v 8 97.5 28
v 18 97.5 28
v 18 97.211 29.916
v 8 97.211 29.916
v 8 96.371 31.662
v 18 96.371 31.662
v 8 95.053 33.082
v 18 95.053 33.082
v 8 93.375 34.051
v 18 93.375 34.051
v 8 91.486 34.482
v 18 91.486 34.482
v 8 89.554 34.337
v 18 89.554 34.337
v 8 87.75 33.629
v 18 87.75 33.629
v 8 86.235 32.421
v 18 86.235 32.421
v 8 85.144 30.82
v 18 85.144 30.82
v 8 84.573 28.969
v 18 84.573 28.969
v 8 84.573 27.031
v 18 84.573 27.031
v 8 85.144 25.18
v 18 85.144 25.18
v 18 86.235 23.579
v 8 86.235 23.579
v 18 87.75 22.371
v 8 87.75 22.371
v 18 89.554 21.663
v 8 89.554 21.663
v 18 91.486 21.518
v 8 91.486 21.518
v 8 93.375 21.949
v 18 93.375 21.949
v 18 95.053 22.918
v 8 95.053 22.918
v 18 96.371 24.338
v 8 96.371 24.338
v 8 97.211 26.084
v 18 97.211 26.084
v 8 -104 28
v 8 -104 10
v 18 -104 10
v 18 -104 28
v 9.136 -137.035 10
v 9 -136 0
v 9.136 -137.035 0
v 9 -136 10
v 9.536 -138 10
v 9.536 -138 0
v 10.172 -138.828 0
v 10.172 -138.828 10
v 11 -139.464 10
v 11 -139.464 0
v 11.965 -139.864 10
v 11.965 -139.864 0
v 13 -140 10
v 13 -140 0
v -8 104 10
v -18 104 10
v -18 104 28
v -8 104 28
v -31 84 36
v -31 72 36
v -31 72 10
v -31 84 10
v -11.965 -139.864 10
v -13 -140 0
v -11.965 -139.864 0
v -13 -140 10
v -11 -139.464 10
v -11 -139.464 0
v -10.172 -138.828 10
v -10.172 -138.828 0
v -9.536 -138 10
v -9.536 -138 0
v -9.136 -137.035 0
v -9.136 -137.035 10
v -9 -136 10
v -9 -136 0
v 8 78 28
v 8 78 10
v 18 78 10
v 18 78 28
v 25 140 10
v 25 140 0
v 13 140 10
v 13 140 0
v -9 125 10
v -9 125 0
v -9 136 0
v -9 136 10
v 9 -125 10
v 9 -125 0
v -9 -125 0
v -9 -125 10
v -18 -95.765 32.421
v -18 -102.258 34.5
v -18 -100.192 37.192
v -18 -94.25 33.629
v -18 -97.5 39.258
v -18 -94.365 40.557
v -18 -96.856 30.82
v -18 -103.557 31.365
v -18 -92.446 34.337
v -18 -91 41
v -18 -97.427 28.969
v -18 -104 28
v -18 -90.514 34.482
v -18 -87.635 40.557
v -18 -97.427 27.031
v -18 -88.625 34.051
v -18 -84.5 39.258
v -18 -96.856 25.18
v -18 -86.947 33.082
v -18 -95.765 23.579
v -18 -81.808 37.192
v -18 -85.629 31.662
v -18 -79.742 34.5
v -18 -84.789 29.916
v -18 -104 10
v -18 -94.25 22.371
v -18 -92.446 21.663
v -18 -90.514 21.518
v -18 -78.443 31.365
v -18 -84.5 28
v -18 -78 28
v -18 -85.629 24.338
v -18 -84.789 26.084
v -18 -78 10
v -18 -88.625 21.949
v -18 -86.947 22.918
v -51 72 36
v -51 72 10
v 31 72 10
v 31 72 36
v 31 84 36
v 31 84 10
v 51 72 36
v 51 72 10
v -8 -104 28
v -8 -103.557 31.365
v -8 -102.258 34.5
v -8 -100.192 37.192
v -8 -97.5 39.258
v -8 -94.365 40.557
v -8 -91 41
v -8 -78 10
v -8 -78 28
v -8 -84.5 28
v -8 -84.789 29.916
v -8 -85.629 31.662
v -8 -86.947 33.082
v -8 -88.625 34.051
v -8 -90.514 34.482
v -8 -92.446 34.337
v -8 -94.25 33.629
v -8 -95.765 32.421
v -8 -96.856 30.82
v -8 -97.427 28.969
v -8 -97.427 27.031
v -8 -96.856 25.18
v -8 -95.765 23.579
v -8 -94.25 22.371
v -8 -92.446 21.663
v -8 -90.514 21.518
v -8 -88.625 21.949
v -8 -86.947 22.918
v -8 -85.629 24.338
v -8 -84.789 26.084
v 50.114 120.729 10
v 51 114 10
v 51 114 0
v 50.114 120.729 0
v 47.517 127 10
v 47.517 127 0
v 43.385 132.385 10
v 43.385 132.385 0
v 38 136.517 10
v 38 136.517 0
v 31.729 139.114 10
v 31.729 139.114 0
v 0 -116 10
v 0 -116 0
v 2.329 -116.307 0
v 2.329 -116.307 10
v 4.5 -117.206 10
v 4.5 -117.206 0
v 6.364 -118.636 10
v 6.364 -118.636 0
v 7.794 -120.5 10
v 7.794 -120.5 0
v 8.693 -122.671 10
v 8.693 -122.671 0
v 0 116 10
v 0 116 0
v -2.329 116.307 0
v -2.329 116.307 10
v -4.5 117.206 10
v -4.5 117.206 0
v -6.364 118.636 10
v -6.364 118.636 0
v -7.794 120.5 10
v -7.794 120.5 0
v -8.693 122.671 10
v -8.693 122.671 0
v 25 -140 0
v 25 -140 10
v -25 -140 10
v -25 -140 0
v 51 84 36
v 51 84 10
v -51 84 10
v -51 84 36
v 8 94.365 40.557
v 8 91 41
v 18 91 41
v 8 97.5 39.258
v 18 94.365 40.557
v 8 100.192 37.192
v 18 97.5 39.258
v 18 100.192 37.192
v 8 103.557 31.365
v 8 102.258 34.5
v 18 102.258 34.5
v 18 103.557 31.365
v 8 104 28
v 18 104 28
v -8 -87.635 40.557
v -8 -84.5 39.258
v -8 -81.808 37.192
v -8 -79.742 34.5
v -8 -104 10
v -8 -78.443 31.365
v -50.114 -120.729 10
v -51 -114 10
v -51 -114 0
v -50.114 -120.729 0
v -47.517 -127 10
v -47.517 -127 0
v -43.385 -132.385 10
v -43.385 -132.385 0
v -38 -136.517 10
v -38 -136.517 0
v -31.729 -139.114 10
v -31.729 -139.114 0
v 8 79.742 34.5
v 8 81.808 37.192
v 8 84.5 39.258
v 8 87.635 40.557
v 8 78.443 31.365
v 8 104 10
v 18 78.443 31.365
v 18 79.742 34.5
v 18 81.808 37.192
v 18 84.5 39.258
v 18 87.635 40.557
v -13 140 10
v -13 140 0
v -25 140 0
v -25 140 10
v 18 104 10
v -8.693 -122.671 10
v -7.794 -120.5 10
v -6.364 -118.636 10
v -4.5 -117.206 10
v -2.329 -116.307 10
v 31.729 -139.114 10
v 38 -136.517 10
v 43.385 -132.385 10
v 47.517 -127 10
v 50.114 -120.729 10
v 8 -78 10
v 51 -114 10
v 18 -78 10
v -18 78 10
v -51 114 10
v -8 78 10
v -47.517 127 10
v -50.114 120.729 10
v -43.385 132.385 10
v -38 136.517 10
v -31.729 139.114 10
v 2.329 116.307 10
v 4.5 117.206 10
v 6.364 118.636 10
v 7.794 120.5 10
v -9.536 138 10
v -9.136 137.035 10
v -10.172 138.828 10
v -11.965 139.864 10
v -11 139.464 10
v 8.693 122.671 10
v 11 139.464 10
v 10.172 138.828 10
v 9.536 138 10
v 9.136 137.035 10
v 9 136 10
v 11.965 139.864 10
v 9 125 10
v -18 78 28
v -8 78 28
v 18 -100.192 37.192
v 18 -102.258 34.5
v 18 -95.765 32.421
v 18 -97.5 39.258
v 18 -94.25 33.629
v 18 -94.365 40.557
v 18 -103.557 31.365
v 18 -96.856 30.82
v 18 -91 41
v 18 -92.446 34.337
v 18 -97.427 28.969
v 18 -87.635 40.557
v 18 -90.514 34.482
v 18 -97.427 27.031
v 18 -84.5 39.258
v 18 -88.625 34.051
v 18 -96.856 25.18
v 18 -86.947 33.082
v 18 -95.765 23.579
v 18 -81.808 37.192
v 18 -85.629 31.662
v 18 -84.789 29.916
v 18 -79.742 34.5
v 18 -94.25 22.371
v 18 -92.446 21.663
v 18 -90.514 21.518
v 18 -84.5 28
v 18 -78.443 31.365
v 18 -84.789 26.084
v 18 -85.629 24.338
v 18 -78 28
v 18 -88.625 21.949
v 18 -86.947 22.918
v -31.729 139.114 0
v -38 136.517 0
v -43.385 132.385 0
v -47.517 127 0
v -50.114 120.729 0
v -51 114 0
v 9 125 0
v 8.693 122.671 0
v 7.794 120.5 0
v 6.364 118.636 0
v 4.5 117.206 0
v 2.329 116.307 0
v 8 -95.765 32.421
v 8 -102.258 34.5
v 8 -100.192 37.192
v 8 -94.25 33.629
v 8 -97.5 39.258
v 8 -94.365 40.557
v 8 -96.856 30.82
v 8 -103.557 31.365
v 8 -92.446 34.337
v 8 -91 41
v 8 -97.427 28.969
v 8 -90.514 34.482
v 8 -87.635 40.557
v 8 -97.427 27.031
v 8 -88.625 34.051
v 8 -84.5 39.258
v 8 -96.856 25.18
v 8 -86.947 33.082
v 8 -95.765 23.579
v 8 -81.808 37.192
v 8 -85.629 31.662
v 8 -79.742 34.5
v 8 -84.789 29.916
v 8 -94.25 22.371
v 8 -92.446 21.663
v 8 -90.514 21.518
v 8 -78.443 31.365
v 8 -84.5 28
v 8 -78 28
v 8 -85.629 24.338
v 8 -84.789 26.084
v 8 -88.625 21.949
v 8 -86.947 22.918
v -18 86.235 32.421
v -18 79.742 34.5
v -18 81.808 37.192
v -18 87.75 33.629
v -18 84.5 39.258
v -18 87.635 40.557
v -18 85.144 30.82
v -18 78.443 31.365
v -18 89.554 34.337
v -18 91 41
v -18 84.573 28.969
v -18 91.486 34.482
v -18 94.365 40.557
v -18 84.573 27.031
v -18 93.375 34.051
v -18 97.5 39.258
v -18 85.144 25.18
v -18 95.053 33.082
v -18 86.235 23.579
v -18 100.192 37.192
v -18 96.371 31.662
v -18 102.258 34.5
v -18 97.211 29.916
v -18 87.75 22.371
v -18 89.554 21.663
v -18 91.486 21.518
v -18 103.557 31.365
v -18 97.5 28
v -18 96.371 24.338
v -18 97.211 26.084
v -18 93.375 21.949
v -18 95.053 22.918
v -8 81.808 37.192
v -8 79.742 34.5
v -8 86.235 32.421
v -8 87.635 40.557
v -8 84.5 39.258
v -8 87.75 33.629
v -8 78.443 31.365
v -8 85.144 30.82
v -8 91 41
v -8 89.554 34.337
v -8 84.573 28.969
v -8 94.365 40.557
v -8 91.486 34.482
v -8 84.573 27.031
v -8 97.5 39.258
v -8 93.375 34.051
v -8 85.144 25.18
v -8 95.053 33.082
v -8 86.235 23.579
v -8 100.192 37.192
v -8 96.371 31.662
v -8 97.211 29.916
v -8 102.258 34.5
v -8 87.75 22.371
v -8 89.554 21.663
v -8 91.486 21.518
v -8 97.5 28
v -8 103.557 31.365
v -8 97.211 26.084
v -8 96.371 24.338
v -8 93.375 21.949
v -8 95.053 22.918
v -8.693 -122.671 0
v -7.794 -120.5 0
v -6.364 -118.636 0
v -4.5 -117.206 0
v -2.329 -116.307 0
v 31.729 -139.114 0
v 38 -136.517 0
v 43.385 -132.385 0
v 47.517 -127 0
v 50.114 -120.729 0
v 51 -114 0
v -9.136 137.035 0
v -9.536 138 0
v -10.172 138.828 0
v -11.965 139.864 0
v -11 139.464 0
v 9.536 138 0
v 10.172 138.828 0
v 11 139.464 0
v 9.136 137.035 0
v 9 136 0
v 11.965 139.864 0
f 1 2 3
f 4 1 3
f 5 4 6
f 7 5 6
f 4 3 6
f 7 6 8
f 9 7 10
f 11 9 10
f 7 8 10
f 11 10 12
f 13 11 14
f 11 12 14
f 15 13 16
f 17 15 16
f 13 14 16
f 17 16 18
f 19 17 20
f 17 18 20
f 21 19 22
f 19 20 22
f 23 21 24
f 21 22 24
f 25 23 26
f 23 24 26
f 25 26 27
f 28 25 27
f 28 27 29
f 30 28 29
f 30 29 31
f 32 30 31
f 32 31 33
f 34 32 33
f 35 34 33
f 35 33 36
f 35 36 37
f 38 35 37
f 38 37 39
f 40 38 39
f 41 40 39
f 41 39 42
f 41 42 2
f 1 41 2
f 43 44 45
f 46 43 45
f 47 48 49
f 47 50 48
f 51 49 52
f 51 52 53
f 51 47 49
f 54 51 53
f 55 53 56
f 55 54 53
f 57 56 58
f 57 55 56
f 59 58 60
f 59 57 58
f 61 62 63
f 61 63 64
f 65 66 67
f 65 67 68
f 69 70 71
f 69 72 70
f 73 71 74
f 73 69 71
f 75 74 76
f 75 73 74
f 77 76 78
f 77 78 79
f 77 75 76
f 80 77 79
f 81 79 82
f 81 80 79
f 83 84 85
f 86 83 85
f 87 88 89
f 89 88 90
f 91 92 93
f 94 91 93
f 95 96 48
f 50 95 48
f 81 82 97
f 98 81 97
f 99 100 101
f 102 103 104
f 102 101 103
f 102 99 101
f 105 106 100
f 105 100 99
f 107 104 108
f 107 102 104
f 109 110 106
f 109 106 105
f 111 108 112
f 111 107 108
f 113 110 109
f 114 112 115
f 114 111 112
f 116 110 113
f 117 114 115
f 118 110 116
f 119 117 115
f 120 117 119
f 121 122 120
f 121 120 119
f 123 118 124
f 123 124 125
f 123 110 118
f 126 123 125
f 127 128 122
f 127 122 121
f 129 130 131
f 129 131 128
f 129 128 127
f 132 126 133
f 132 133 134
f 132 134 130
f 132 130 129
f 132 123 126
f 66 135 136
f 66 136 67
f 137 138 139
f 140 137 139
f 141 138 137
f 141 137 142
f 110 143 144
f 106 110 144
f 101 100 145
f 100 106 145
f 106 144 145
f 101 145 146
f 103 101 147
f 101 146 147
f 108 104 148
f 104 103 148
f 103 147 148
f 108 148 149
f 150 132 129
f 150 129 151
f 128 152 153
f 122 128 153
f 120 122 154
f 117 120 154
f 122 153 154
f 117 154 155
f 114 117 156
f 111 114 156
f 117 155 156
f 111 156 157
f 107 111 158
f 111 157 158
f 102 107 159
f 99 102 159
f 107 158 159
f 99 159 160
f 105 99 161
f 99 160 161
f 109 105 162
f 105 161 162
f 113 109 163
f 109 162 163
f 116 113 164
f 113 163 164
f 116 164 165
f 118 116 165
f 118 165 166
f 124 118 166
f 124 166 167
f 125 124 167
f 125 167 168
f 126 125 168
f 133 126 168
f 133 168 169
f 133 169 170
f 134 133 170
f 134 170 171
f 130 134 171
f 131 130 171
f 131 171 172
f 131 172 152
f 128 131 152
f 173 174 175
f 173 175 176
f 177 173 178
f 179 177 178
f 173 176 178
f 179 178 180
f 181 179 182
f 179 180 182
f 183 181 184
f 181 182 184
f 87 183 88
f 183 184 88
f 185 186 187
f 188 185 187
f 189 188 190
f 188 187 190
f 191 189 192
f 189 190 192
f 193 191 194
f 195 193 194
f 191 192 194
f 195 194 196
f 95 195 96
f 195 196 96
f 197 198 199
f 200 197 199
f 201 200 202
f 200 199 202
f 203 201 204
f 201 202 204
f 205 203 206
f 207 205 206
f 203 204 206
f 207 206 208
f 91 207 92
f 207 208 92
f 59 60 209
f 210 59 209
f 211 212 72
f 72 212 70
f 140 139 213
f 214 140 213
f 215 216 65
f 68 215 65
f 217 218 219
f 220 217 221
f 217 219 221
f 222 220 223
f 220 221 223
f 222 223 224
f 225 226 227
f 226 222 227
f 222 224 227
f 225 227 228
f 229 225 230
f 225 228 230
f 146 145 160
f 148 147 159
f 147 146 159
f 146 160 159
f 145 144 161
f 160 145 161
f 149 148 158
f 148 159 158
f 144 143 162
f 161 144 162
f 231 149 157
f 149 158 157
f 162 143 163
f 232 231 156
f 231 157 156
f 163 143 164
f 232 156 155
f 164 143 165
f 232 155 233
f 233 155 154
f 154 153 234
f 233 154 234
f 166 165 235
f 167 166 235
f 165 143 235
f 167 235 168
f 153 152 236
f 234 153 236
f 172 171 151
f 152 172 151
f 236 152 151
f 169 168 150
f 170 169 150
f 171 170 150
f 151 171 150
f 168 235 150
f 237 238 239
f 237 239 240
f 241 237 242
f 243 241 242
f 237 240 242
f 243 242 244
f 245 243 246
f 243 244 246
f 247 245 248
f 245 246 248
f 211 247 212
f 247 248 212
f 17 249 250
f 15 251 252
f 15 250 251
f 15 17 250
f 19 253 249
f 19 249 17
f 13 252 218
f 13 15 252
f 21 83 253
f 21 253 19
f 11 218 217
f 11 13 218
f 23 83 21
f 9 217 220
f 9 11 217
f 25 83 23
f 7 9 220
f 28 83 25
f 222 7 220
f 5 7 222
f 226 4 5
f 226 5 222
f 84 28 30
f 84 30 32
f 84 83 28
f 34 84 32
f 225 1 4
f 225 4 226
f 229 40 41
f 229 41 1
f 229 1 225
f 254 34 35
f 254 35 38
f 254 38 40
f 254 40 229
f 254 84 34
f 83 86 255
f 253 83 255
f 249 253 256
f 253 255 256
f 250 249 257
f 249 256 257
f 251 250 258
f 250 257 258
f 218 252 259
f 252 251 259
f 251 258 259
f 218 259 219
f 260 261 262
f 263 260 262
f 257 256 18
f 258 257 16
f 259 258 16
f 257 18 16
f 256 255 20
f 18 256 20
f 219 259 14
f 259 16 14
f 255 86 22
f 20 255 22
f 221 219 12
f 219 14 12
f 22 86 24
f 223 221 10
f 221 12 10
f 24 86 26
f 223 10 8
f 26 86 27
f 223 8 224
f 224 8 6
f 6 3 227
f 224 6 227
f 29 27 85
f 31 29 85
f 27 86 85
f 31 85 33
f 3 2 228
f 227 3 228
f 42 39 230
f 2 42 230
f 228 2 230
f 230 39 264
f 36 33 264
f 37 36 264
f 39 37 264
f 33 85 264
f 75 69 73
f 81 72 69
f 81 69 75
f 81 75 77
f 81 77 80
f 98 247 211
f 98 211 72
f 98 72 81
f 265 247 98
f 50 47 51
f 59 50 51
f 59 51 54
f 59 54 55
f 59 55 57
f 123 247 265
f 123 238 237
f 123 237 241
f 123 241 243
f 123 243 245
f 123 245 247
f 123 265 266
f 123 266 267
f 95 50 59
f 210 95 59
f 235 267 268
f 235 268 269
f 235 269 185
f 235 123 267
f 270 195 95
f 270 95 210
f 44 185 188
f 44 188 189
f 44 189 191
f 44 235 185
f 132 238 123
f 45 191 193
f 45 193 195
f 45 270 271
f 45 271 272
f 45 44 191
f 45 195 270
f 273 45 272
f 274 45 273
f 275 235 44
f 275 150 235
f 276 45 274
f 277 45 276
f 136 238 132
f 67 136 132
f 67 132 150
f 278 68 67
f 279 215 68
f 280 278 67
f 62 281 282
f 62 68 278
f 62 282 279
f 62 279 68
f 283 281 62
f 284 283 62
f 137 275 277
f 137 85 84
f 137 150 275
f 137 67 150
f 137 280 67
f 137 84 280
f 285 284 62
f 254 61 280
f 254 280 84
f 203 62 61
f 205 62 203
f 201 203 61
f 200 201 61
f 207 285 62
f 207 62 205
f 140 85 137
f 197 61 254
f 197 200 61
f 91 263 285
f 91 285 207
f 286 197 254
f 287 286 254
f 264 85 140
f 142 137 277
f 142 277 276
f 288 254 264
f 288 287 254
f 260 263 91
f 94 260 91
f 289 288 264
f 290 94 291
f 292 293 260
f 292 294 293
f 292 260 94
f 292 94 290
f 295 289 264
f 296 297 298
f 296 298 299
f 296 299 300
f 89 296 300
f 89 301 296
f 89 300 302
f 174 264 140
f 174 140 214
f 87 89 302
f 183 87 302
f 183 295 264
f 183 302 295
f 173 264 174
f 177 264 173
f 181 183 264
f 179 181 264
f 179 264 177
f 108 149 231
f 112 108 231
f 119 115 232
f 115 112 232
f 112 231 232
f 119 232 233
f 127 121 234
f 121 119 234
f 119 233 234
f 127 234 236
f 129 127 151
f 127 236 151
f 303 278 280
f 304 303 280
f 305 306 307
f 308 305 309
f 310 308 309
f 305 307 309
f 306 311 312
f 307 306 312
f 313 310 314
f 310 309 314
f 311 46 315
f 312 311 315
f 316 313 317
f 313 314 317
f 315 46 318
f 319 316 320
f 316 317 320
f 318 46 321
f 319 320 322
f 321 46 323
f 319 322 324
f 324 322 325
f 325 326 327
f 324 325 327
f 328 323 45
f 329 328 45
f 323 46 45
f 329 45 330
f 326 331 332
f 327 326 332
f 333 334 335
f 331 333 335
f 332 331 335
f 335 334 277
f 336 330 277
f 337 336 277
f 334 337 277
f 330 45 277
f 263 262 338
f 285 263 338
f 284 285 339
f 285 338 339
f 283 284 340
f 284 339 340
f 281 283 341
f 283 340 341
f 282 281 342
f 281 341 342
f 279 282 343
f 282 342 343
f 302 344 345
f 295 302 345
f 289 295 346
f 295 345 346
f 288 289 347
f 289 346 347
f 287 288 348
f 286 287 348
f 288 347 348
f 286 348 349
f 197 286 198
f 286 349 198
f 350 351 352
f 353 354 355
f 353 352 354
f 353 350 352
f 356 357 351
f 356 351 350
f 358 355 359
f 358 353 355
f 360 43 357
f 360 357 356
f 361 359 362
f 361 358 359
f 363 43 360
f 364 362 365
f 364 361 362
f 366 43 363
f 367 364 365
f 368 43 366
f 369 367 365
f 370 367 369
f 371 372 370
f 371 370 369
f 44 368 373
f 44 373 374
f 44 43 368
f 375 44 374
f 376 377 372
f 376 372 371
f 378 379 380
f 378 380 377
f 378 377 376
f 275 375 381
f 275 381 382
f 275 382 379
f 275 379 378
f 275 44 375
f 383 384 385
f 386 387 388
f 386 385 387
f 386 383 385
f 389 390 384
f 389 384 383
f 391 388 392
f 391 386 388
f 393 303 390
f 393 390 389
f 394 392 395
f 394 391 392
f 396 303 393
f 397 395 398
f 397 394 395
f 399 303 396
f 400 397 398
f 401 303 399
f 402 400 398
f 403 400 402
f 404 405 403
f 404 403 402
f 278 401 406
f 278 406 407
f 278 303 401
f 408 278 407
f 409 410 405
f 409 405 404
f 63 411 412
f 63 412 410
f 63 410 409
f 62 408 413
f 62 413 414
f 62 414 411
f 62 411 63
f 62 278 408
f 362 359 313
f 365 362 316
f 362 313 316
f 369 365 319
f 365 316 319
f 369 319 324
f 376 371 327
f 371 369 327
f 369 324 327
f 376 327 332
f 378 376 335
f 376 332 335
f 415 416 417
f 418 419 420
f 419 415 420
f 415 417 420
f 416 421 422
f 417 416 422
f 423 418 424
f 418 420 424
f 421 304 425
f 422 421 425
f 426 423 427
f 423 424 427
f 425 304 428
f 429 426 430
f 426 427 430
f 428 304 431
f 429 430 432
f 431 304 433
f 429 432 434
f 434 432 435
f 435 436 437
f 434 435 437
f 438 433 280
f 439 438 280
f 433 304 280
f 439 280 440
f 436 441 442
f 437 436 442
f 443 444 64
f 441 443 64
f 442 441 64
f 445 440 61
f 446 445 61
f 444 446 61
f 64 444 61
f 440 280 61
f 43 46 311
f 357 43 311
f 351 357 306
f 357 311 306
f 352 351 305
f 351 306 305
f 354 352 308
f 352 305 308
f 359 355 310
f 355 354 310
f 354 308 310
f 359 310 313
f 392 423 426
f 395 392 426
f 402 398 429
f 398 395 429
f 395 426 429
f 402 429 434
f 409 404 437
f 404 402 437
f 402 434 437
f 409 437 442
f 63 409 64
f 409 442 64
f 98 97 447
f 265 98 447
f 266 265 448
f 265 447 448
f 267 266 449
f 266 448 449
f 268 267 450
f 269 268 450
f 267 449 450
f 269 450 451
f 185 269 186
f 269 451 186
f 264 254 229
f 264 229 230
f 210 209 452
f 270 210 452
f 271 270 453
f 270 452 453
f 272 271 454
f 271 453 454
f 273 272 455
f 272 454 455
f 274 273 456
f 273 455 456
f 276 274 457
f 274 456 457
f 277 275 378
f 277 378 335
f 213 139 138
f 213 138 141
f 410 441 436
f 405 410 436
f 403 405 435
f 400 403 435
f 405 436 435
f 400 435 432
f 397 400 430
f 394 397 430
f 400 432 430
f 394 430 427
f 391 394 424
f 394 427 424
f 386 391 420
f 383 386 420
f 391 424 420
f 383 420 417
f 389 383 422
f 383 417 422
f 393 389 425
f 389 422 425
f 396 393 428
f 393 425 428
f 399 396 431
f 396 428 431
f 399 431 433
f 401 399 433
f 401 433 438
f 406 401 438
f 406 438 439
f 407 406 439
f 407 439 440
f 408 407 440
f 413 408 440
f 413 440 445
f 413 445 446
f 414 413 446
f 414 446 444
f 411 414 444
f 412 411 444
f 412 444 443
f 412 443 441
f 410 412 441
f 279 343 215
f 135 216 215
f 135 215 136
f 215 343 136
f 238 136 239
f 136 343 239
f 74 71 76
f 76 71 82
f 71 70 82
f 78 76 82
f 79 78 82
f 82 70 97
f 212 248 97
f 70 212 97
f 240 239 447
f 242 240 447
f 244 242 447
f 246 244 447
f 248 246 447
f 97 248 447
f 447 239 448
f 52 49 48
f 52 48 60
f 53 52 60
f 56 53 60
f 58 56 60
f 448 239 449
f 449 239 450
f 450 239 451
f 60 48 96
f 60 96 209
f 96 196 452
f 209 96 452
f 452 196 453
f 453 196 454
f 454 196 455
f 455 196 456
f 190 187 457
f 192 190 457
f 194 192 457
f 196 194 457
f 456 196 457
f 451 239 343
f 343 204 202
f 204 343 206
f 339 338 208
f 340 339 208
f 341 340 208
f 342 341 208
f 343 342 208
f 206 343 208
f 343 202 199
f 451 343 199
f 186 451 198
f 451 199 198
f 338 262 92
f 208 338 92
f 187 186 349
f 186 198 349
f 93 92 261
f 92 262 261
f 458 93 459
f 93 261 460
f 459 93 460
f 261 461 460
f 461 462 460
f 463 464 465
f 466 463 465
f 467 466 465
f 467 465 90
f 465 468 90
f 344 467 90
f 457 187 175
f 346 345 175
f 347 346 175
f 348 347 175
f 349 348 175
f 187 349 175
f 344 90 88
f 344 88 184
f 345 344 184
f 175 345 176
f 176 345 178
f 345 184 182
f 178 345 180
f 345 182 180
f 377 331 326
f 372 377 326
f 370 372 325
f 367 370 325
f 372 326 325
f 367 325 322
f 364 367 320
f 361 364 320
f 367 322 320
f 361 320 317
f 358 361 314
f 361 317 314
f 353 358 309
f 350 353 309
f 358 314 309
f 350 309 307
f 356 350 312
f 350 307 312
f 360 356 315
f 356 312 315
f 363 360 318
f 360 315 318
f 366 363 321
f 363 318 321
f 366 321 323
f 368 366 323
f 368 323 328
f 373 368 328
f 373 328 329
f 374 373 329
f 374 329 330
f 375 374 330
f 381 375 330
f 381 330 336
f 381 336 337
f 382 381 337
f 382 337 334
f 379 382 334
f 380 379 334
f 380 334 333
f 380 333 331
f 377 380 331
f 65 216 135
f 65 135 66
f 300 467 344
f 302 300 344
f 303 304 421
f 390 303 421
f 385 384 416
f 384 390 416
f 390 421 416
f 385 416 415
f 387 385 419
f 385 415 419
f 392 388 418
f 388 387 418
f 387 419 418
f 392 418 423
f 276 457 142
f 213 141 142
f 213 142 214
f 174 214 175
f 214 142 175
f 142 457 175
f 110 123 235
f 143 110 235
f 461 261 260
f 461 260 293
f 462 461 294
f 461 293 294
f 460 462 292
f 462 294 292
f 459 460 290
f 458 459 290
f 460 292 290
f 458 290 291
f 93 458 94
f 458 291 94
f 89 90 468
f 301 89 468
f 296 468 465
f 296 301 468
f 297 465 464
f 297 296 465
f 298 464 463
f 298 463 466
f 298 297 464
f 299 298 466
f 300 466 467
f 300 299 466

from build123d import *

# Parameters (mm, degrees)
F1_DEPTH  = 10
F2_R      = 4
F3_W      = 10
F3_H      = 26
F4_DEPTH  = 31
F5_R      = 6.5
F6_DEPTH  = 69.001
F7_R      = 6.5
F8_DEPTH  = 69.001
F9_W      = 20
F9_H      = 12
F10_DEPTH = 26


with BuildPart() as f1:
    # F0 (on Top) → F1 (new body)
    with BuildSketch(Plane.XY):
        with BuildLine():
            Line((-9, 140), (-25, 140))
            ThreePointArc((-25, 140), (-43.384776, 132.384776), (-51, 114))
            Line((-51, 114), (-51, -114))
            ThreePointArc((-51, -114), (-43.384776, -132.384776), (-25, -140))
            Line((-25, -140), (-9, -140))
            Line((-9, -140), (-9, -125))
            ThreePointArc((-9, -125), (-6.363961, -118.636039), (0, -116))
            ThreePointArc((0, -116), (6.363961, -118.636039), (9, -125))
            Line((9, -125), (9, -140))
            Line((9, -140), (25, -140))
            ThreePointArc((25, -140), (43.384776, -132.384776), (51, -114))
            Line((51, -114), (51, 114))
            ThreePointArc((51, 114), (43.384776, 132.384776), (25, 140))
            Line((25, 140), (9, 140))
            Line((9, 140), (9, 125))
            ThreePointArc((9, 125), (6.363961, 118.636039), (0, 116))
            ThreePointArc((0, 116), (-6.363961, 118.636039), (-9, 125))
            Line((-9, 125), (-9, 140))
        make_face()
    extrude(amount=F1_DEPTH)

    # F2
    f2_edges = [f1.edges().sort_by_distance(p)[0] for p in [
        (-9, -140, 5),
        (9, -140, 5),
        (-9, 140, 5),
        (9, 140, 5),
    ]]
    fillet(f2_edges, radius=F2_R)

    # F3 (on face) → F4 (join)
    with BuildSketch(Plane.XY.offset(10)):
        with Locations((13, -91)):
            Rectangle(F3_W, F3_H)
        with Locations((-13, -91)):
            Rectangle(F3_W, F3_H)
        with Locations((-13, 91)):
            Rectangle(F3_W, F3_H)
        with Locations((13, 91)):
            Rectangle(F3_W, F3_H)
    extrude(amount=F4_DEPTH)

    # F5 (on face) → F6 (cut, through all)
    with BuildSketch(Plane.YZ.offset(18)):
        with Locations((-91, 28)):
            Circle(F5_R)
        with BuildLine():
            Line((-78, 41), (-91, 41))
            ThreePointArc((-91, 41), (-81.807612, 37.192388), (-78, 28))
            Line((-78, 28), (-78, 41))
        make_face()
        with BuildLine():
            Line((-104, 41), (-104, 28))
            ThreePointArc((-104, 28), (-100.192388, 37.192388), (-91, 41))
            Line((-91, 41), (-104, 41))
        make_face()
    extrude(amount=-F6_DEPTH, mode=Mode.SUBTRACT)

    # F7 (on face) → F8 (cut, through all)
    with BuildSketch(Plane.YZ.offset(18)):
        with Locations((91, 28)):
            Circle(F7_R)
        with BuildLine():
            Line((78, 41), (78, 28))
            ThreePointArc((78, 28), (81.807612, 37.192388), (91, 41))
            Line((91, 41), (78, 41))
        make_face()
        with BuildLine():
            Line((104, 41), (91, 41))
            ThreePointArc((91, 41), (100.192388, 37.192388), (104, 28))
            Line((104, 28), (104, 41))
        make_face()
    extrude(amount=-F8_DEPTH, mode=Mode.SUBTRACT)

    # F9 (on face) → F10 (join)
    with BuildSketch(Plane.XY.offset(10)):
        with Locations((41, 78)):
            Rectangle(F9_W, F9_H)
        with Locations((-41, 78)):
            Rectangle(F9_W, F9_H)
    extrude(amount=F10_DEPTH)


solid = f1.part
